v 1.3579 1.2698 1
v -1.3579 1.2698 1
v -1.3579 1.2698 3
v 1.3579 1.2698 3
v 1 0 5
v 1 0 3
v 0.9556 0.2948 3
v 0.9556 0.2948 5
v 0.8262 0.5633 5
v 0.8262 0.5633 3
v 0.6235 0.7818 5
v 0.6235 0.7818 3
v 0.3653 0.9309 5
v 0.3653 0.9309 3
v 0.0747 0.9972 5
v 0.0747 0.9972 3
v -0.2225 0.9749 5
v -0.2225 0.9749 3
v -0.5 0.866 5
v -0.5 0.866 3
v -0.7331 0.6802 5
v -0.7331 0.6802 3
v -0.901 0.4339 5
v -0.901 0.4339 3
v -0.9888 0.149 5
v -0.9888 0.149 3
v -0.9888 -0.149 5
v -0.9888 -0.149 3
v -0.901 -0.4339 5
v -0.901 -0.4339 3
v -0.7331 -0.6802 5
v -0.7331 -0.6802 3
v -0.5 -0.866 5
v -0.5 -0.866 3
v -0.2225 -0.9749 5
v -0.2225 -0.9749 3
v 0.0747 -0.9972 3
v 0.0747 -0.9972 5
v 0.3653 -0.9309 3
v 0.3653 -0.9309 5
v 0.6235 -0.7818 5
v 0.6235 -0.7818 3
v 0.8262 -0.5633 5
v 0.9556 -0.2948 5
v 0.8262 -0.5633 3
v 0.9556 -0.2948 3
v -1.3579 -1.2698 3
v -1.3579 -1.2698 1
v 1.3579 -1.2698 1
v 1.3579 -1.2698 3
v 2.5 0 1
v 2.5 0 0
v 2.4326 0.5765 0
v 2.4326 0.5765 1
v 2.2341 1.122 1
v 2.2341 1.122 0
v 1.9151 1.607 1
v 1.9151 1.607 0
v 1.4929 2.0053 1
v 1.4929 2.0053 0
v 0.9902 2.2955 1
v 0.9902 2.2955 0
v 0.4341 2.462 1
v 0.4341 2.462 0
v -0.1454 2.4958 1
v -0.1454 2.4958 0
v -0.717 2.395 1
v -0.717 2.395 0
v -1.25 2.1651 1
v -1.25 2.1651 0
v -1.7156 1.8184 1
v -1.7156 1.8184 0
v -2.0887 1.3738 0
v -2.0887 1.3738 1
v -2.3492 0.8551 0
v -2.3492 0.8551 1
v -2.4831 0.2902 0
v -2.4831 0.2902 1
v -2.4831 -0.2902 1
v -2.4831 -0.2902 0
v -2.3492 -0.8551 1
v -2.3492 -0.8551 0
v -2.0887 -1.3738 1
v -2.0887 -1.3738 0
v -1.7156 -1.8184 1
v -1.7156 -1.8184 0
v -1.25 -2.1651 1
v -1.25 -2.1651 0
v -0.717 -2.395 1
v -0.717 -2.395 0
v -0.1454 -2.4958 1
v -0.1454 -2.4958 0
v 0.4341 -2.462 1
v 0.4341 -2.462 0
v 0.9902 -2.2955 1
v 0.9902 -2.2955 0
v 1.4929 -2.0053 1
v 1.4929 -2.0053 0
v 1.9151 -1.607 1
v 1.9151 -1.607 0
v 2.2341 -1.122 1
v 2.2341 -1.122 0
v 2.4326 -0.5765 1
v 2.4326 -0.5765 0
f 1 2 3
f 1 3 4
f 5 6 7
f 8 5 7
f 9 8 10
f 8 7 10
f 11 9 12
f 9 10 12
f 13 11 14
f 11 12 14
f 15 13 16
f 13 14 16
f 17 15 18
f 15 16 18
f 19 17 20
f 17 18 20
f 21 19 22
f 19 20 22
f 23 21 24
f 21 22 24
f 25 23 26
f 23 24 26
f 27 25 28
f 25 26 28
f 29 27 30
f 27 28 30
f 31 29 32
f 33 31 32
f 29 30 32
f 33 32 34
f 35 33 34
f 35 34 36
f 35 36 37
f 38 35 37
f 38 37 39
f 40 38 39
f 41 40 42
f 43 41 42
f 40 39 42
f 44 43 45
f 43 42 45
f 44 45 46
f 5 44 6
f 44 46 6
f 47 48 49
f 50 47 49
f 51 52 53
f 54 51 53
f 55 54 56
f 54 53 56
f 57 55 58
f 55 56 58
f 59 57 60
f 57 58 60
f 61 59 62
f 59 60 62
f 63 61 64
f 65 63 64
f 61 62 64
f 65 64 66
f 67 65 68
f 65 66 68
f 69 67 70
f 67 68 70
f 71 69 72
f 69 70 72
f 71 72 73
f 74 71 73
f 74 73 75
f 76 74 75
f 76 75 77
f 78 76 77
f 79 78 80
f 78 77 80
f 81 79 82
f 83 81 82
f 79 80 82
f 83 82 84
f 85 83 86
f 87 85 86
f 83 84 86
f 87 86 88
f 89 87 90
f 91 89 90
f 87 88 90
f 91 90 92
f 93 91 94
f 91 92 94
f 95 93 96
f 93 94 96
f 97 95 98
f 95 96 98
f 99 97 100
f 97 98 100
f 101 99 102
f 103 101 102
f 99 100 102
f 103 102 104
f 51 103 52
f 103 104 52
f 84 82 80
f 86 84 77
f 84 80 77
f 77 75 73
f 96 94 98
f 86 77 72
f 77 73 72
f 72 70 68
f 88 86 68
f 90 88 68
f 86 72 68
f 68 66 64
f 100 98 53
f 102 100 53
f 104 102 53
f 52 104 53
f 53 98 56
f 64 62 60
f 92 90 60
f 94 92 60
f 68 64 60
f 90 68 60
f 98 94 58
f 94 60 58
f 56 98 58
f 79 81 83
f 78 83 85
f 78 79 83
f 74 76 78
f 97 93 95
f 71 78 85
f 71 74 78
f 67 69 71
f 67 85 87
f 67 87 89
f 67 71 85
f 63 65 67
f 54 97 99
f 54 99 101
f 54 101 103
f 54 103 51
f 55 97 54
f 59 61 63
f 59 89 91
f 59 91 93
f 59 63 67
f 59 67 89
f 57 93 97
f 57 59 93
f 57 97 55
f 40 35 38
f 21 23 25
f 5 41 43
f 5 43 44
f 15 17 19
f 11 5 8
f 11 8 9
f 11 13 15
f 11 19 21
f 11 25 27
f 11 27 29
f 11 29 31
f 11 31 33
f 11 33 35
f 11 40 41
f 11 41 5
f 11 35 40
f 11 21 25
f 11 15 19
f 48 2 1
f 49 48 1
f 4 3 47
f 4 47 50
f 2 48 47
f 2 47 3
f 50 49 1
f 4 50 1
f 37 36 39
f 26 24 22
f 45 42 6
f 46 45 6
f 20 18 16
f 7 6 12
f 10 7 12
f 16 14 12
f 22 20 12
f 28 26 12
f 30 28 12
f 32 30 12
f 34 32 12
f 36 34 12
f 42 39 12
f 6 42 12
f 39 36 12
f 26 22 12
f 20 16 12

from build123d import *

# Parameters (mm, degrees)
ESQUISSE1_R        = 2.5
BOSS_EXTRU_1_DEPTH = 1
ESQUISSE2_W        = 2.7158457
ESQUISSE2_H        = 2.539681012
BOSS_EXTRU_2_DEPTH = 2
ESQUISSE3_R        = 1
BOSS_EXTRU_3_DEPTH = 2


with BuildPart() as part:
    # Esquisse1 → Boss.-Extru.1 (new body)
    with BuildSketch(Plane.XY):
        Circle(ESQUISSE1_R)
    extrude(amount=BOSS_EXTRU_1_DEPTH)


with BuildPart() as body_2:
    # Esquisse2 → Boss.-Extru.2 (new body)
    with BuildSketch(Plane.XY.offset(1)):
        Rectangle(ESQUISSE2_W, ESQUISSE2_H)
    extrude(amount=BOSS_EXTRU_2_DEPTH)


with BuildPart() as body_3:
    # Esquisse3 → Boss.-Extru.3 (new body)
    with BuildSketch(Plane.XY.offset(3)):
        Circle(ESQUISSE3_R)
    extrude(amount=BOSS_EXTRU_3_DEPTH)


solid = Compound([part.part, body_2.part, body_3.part])
